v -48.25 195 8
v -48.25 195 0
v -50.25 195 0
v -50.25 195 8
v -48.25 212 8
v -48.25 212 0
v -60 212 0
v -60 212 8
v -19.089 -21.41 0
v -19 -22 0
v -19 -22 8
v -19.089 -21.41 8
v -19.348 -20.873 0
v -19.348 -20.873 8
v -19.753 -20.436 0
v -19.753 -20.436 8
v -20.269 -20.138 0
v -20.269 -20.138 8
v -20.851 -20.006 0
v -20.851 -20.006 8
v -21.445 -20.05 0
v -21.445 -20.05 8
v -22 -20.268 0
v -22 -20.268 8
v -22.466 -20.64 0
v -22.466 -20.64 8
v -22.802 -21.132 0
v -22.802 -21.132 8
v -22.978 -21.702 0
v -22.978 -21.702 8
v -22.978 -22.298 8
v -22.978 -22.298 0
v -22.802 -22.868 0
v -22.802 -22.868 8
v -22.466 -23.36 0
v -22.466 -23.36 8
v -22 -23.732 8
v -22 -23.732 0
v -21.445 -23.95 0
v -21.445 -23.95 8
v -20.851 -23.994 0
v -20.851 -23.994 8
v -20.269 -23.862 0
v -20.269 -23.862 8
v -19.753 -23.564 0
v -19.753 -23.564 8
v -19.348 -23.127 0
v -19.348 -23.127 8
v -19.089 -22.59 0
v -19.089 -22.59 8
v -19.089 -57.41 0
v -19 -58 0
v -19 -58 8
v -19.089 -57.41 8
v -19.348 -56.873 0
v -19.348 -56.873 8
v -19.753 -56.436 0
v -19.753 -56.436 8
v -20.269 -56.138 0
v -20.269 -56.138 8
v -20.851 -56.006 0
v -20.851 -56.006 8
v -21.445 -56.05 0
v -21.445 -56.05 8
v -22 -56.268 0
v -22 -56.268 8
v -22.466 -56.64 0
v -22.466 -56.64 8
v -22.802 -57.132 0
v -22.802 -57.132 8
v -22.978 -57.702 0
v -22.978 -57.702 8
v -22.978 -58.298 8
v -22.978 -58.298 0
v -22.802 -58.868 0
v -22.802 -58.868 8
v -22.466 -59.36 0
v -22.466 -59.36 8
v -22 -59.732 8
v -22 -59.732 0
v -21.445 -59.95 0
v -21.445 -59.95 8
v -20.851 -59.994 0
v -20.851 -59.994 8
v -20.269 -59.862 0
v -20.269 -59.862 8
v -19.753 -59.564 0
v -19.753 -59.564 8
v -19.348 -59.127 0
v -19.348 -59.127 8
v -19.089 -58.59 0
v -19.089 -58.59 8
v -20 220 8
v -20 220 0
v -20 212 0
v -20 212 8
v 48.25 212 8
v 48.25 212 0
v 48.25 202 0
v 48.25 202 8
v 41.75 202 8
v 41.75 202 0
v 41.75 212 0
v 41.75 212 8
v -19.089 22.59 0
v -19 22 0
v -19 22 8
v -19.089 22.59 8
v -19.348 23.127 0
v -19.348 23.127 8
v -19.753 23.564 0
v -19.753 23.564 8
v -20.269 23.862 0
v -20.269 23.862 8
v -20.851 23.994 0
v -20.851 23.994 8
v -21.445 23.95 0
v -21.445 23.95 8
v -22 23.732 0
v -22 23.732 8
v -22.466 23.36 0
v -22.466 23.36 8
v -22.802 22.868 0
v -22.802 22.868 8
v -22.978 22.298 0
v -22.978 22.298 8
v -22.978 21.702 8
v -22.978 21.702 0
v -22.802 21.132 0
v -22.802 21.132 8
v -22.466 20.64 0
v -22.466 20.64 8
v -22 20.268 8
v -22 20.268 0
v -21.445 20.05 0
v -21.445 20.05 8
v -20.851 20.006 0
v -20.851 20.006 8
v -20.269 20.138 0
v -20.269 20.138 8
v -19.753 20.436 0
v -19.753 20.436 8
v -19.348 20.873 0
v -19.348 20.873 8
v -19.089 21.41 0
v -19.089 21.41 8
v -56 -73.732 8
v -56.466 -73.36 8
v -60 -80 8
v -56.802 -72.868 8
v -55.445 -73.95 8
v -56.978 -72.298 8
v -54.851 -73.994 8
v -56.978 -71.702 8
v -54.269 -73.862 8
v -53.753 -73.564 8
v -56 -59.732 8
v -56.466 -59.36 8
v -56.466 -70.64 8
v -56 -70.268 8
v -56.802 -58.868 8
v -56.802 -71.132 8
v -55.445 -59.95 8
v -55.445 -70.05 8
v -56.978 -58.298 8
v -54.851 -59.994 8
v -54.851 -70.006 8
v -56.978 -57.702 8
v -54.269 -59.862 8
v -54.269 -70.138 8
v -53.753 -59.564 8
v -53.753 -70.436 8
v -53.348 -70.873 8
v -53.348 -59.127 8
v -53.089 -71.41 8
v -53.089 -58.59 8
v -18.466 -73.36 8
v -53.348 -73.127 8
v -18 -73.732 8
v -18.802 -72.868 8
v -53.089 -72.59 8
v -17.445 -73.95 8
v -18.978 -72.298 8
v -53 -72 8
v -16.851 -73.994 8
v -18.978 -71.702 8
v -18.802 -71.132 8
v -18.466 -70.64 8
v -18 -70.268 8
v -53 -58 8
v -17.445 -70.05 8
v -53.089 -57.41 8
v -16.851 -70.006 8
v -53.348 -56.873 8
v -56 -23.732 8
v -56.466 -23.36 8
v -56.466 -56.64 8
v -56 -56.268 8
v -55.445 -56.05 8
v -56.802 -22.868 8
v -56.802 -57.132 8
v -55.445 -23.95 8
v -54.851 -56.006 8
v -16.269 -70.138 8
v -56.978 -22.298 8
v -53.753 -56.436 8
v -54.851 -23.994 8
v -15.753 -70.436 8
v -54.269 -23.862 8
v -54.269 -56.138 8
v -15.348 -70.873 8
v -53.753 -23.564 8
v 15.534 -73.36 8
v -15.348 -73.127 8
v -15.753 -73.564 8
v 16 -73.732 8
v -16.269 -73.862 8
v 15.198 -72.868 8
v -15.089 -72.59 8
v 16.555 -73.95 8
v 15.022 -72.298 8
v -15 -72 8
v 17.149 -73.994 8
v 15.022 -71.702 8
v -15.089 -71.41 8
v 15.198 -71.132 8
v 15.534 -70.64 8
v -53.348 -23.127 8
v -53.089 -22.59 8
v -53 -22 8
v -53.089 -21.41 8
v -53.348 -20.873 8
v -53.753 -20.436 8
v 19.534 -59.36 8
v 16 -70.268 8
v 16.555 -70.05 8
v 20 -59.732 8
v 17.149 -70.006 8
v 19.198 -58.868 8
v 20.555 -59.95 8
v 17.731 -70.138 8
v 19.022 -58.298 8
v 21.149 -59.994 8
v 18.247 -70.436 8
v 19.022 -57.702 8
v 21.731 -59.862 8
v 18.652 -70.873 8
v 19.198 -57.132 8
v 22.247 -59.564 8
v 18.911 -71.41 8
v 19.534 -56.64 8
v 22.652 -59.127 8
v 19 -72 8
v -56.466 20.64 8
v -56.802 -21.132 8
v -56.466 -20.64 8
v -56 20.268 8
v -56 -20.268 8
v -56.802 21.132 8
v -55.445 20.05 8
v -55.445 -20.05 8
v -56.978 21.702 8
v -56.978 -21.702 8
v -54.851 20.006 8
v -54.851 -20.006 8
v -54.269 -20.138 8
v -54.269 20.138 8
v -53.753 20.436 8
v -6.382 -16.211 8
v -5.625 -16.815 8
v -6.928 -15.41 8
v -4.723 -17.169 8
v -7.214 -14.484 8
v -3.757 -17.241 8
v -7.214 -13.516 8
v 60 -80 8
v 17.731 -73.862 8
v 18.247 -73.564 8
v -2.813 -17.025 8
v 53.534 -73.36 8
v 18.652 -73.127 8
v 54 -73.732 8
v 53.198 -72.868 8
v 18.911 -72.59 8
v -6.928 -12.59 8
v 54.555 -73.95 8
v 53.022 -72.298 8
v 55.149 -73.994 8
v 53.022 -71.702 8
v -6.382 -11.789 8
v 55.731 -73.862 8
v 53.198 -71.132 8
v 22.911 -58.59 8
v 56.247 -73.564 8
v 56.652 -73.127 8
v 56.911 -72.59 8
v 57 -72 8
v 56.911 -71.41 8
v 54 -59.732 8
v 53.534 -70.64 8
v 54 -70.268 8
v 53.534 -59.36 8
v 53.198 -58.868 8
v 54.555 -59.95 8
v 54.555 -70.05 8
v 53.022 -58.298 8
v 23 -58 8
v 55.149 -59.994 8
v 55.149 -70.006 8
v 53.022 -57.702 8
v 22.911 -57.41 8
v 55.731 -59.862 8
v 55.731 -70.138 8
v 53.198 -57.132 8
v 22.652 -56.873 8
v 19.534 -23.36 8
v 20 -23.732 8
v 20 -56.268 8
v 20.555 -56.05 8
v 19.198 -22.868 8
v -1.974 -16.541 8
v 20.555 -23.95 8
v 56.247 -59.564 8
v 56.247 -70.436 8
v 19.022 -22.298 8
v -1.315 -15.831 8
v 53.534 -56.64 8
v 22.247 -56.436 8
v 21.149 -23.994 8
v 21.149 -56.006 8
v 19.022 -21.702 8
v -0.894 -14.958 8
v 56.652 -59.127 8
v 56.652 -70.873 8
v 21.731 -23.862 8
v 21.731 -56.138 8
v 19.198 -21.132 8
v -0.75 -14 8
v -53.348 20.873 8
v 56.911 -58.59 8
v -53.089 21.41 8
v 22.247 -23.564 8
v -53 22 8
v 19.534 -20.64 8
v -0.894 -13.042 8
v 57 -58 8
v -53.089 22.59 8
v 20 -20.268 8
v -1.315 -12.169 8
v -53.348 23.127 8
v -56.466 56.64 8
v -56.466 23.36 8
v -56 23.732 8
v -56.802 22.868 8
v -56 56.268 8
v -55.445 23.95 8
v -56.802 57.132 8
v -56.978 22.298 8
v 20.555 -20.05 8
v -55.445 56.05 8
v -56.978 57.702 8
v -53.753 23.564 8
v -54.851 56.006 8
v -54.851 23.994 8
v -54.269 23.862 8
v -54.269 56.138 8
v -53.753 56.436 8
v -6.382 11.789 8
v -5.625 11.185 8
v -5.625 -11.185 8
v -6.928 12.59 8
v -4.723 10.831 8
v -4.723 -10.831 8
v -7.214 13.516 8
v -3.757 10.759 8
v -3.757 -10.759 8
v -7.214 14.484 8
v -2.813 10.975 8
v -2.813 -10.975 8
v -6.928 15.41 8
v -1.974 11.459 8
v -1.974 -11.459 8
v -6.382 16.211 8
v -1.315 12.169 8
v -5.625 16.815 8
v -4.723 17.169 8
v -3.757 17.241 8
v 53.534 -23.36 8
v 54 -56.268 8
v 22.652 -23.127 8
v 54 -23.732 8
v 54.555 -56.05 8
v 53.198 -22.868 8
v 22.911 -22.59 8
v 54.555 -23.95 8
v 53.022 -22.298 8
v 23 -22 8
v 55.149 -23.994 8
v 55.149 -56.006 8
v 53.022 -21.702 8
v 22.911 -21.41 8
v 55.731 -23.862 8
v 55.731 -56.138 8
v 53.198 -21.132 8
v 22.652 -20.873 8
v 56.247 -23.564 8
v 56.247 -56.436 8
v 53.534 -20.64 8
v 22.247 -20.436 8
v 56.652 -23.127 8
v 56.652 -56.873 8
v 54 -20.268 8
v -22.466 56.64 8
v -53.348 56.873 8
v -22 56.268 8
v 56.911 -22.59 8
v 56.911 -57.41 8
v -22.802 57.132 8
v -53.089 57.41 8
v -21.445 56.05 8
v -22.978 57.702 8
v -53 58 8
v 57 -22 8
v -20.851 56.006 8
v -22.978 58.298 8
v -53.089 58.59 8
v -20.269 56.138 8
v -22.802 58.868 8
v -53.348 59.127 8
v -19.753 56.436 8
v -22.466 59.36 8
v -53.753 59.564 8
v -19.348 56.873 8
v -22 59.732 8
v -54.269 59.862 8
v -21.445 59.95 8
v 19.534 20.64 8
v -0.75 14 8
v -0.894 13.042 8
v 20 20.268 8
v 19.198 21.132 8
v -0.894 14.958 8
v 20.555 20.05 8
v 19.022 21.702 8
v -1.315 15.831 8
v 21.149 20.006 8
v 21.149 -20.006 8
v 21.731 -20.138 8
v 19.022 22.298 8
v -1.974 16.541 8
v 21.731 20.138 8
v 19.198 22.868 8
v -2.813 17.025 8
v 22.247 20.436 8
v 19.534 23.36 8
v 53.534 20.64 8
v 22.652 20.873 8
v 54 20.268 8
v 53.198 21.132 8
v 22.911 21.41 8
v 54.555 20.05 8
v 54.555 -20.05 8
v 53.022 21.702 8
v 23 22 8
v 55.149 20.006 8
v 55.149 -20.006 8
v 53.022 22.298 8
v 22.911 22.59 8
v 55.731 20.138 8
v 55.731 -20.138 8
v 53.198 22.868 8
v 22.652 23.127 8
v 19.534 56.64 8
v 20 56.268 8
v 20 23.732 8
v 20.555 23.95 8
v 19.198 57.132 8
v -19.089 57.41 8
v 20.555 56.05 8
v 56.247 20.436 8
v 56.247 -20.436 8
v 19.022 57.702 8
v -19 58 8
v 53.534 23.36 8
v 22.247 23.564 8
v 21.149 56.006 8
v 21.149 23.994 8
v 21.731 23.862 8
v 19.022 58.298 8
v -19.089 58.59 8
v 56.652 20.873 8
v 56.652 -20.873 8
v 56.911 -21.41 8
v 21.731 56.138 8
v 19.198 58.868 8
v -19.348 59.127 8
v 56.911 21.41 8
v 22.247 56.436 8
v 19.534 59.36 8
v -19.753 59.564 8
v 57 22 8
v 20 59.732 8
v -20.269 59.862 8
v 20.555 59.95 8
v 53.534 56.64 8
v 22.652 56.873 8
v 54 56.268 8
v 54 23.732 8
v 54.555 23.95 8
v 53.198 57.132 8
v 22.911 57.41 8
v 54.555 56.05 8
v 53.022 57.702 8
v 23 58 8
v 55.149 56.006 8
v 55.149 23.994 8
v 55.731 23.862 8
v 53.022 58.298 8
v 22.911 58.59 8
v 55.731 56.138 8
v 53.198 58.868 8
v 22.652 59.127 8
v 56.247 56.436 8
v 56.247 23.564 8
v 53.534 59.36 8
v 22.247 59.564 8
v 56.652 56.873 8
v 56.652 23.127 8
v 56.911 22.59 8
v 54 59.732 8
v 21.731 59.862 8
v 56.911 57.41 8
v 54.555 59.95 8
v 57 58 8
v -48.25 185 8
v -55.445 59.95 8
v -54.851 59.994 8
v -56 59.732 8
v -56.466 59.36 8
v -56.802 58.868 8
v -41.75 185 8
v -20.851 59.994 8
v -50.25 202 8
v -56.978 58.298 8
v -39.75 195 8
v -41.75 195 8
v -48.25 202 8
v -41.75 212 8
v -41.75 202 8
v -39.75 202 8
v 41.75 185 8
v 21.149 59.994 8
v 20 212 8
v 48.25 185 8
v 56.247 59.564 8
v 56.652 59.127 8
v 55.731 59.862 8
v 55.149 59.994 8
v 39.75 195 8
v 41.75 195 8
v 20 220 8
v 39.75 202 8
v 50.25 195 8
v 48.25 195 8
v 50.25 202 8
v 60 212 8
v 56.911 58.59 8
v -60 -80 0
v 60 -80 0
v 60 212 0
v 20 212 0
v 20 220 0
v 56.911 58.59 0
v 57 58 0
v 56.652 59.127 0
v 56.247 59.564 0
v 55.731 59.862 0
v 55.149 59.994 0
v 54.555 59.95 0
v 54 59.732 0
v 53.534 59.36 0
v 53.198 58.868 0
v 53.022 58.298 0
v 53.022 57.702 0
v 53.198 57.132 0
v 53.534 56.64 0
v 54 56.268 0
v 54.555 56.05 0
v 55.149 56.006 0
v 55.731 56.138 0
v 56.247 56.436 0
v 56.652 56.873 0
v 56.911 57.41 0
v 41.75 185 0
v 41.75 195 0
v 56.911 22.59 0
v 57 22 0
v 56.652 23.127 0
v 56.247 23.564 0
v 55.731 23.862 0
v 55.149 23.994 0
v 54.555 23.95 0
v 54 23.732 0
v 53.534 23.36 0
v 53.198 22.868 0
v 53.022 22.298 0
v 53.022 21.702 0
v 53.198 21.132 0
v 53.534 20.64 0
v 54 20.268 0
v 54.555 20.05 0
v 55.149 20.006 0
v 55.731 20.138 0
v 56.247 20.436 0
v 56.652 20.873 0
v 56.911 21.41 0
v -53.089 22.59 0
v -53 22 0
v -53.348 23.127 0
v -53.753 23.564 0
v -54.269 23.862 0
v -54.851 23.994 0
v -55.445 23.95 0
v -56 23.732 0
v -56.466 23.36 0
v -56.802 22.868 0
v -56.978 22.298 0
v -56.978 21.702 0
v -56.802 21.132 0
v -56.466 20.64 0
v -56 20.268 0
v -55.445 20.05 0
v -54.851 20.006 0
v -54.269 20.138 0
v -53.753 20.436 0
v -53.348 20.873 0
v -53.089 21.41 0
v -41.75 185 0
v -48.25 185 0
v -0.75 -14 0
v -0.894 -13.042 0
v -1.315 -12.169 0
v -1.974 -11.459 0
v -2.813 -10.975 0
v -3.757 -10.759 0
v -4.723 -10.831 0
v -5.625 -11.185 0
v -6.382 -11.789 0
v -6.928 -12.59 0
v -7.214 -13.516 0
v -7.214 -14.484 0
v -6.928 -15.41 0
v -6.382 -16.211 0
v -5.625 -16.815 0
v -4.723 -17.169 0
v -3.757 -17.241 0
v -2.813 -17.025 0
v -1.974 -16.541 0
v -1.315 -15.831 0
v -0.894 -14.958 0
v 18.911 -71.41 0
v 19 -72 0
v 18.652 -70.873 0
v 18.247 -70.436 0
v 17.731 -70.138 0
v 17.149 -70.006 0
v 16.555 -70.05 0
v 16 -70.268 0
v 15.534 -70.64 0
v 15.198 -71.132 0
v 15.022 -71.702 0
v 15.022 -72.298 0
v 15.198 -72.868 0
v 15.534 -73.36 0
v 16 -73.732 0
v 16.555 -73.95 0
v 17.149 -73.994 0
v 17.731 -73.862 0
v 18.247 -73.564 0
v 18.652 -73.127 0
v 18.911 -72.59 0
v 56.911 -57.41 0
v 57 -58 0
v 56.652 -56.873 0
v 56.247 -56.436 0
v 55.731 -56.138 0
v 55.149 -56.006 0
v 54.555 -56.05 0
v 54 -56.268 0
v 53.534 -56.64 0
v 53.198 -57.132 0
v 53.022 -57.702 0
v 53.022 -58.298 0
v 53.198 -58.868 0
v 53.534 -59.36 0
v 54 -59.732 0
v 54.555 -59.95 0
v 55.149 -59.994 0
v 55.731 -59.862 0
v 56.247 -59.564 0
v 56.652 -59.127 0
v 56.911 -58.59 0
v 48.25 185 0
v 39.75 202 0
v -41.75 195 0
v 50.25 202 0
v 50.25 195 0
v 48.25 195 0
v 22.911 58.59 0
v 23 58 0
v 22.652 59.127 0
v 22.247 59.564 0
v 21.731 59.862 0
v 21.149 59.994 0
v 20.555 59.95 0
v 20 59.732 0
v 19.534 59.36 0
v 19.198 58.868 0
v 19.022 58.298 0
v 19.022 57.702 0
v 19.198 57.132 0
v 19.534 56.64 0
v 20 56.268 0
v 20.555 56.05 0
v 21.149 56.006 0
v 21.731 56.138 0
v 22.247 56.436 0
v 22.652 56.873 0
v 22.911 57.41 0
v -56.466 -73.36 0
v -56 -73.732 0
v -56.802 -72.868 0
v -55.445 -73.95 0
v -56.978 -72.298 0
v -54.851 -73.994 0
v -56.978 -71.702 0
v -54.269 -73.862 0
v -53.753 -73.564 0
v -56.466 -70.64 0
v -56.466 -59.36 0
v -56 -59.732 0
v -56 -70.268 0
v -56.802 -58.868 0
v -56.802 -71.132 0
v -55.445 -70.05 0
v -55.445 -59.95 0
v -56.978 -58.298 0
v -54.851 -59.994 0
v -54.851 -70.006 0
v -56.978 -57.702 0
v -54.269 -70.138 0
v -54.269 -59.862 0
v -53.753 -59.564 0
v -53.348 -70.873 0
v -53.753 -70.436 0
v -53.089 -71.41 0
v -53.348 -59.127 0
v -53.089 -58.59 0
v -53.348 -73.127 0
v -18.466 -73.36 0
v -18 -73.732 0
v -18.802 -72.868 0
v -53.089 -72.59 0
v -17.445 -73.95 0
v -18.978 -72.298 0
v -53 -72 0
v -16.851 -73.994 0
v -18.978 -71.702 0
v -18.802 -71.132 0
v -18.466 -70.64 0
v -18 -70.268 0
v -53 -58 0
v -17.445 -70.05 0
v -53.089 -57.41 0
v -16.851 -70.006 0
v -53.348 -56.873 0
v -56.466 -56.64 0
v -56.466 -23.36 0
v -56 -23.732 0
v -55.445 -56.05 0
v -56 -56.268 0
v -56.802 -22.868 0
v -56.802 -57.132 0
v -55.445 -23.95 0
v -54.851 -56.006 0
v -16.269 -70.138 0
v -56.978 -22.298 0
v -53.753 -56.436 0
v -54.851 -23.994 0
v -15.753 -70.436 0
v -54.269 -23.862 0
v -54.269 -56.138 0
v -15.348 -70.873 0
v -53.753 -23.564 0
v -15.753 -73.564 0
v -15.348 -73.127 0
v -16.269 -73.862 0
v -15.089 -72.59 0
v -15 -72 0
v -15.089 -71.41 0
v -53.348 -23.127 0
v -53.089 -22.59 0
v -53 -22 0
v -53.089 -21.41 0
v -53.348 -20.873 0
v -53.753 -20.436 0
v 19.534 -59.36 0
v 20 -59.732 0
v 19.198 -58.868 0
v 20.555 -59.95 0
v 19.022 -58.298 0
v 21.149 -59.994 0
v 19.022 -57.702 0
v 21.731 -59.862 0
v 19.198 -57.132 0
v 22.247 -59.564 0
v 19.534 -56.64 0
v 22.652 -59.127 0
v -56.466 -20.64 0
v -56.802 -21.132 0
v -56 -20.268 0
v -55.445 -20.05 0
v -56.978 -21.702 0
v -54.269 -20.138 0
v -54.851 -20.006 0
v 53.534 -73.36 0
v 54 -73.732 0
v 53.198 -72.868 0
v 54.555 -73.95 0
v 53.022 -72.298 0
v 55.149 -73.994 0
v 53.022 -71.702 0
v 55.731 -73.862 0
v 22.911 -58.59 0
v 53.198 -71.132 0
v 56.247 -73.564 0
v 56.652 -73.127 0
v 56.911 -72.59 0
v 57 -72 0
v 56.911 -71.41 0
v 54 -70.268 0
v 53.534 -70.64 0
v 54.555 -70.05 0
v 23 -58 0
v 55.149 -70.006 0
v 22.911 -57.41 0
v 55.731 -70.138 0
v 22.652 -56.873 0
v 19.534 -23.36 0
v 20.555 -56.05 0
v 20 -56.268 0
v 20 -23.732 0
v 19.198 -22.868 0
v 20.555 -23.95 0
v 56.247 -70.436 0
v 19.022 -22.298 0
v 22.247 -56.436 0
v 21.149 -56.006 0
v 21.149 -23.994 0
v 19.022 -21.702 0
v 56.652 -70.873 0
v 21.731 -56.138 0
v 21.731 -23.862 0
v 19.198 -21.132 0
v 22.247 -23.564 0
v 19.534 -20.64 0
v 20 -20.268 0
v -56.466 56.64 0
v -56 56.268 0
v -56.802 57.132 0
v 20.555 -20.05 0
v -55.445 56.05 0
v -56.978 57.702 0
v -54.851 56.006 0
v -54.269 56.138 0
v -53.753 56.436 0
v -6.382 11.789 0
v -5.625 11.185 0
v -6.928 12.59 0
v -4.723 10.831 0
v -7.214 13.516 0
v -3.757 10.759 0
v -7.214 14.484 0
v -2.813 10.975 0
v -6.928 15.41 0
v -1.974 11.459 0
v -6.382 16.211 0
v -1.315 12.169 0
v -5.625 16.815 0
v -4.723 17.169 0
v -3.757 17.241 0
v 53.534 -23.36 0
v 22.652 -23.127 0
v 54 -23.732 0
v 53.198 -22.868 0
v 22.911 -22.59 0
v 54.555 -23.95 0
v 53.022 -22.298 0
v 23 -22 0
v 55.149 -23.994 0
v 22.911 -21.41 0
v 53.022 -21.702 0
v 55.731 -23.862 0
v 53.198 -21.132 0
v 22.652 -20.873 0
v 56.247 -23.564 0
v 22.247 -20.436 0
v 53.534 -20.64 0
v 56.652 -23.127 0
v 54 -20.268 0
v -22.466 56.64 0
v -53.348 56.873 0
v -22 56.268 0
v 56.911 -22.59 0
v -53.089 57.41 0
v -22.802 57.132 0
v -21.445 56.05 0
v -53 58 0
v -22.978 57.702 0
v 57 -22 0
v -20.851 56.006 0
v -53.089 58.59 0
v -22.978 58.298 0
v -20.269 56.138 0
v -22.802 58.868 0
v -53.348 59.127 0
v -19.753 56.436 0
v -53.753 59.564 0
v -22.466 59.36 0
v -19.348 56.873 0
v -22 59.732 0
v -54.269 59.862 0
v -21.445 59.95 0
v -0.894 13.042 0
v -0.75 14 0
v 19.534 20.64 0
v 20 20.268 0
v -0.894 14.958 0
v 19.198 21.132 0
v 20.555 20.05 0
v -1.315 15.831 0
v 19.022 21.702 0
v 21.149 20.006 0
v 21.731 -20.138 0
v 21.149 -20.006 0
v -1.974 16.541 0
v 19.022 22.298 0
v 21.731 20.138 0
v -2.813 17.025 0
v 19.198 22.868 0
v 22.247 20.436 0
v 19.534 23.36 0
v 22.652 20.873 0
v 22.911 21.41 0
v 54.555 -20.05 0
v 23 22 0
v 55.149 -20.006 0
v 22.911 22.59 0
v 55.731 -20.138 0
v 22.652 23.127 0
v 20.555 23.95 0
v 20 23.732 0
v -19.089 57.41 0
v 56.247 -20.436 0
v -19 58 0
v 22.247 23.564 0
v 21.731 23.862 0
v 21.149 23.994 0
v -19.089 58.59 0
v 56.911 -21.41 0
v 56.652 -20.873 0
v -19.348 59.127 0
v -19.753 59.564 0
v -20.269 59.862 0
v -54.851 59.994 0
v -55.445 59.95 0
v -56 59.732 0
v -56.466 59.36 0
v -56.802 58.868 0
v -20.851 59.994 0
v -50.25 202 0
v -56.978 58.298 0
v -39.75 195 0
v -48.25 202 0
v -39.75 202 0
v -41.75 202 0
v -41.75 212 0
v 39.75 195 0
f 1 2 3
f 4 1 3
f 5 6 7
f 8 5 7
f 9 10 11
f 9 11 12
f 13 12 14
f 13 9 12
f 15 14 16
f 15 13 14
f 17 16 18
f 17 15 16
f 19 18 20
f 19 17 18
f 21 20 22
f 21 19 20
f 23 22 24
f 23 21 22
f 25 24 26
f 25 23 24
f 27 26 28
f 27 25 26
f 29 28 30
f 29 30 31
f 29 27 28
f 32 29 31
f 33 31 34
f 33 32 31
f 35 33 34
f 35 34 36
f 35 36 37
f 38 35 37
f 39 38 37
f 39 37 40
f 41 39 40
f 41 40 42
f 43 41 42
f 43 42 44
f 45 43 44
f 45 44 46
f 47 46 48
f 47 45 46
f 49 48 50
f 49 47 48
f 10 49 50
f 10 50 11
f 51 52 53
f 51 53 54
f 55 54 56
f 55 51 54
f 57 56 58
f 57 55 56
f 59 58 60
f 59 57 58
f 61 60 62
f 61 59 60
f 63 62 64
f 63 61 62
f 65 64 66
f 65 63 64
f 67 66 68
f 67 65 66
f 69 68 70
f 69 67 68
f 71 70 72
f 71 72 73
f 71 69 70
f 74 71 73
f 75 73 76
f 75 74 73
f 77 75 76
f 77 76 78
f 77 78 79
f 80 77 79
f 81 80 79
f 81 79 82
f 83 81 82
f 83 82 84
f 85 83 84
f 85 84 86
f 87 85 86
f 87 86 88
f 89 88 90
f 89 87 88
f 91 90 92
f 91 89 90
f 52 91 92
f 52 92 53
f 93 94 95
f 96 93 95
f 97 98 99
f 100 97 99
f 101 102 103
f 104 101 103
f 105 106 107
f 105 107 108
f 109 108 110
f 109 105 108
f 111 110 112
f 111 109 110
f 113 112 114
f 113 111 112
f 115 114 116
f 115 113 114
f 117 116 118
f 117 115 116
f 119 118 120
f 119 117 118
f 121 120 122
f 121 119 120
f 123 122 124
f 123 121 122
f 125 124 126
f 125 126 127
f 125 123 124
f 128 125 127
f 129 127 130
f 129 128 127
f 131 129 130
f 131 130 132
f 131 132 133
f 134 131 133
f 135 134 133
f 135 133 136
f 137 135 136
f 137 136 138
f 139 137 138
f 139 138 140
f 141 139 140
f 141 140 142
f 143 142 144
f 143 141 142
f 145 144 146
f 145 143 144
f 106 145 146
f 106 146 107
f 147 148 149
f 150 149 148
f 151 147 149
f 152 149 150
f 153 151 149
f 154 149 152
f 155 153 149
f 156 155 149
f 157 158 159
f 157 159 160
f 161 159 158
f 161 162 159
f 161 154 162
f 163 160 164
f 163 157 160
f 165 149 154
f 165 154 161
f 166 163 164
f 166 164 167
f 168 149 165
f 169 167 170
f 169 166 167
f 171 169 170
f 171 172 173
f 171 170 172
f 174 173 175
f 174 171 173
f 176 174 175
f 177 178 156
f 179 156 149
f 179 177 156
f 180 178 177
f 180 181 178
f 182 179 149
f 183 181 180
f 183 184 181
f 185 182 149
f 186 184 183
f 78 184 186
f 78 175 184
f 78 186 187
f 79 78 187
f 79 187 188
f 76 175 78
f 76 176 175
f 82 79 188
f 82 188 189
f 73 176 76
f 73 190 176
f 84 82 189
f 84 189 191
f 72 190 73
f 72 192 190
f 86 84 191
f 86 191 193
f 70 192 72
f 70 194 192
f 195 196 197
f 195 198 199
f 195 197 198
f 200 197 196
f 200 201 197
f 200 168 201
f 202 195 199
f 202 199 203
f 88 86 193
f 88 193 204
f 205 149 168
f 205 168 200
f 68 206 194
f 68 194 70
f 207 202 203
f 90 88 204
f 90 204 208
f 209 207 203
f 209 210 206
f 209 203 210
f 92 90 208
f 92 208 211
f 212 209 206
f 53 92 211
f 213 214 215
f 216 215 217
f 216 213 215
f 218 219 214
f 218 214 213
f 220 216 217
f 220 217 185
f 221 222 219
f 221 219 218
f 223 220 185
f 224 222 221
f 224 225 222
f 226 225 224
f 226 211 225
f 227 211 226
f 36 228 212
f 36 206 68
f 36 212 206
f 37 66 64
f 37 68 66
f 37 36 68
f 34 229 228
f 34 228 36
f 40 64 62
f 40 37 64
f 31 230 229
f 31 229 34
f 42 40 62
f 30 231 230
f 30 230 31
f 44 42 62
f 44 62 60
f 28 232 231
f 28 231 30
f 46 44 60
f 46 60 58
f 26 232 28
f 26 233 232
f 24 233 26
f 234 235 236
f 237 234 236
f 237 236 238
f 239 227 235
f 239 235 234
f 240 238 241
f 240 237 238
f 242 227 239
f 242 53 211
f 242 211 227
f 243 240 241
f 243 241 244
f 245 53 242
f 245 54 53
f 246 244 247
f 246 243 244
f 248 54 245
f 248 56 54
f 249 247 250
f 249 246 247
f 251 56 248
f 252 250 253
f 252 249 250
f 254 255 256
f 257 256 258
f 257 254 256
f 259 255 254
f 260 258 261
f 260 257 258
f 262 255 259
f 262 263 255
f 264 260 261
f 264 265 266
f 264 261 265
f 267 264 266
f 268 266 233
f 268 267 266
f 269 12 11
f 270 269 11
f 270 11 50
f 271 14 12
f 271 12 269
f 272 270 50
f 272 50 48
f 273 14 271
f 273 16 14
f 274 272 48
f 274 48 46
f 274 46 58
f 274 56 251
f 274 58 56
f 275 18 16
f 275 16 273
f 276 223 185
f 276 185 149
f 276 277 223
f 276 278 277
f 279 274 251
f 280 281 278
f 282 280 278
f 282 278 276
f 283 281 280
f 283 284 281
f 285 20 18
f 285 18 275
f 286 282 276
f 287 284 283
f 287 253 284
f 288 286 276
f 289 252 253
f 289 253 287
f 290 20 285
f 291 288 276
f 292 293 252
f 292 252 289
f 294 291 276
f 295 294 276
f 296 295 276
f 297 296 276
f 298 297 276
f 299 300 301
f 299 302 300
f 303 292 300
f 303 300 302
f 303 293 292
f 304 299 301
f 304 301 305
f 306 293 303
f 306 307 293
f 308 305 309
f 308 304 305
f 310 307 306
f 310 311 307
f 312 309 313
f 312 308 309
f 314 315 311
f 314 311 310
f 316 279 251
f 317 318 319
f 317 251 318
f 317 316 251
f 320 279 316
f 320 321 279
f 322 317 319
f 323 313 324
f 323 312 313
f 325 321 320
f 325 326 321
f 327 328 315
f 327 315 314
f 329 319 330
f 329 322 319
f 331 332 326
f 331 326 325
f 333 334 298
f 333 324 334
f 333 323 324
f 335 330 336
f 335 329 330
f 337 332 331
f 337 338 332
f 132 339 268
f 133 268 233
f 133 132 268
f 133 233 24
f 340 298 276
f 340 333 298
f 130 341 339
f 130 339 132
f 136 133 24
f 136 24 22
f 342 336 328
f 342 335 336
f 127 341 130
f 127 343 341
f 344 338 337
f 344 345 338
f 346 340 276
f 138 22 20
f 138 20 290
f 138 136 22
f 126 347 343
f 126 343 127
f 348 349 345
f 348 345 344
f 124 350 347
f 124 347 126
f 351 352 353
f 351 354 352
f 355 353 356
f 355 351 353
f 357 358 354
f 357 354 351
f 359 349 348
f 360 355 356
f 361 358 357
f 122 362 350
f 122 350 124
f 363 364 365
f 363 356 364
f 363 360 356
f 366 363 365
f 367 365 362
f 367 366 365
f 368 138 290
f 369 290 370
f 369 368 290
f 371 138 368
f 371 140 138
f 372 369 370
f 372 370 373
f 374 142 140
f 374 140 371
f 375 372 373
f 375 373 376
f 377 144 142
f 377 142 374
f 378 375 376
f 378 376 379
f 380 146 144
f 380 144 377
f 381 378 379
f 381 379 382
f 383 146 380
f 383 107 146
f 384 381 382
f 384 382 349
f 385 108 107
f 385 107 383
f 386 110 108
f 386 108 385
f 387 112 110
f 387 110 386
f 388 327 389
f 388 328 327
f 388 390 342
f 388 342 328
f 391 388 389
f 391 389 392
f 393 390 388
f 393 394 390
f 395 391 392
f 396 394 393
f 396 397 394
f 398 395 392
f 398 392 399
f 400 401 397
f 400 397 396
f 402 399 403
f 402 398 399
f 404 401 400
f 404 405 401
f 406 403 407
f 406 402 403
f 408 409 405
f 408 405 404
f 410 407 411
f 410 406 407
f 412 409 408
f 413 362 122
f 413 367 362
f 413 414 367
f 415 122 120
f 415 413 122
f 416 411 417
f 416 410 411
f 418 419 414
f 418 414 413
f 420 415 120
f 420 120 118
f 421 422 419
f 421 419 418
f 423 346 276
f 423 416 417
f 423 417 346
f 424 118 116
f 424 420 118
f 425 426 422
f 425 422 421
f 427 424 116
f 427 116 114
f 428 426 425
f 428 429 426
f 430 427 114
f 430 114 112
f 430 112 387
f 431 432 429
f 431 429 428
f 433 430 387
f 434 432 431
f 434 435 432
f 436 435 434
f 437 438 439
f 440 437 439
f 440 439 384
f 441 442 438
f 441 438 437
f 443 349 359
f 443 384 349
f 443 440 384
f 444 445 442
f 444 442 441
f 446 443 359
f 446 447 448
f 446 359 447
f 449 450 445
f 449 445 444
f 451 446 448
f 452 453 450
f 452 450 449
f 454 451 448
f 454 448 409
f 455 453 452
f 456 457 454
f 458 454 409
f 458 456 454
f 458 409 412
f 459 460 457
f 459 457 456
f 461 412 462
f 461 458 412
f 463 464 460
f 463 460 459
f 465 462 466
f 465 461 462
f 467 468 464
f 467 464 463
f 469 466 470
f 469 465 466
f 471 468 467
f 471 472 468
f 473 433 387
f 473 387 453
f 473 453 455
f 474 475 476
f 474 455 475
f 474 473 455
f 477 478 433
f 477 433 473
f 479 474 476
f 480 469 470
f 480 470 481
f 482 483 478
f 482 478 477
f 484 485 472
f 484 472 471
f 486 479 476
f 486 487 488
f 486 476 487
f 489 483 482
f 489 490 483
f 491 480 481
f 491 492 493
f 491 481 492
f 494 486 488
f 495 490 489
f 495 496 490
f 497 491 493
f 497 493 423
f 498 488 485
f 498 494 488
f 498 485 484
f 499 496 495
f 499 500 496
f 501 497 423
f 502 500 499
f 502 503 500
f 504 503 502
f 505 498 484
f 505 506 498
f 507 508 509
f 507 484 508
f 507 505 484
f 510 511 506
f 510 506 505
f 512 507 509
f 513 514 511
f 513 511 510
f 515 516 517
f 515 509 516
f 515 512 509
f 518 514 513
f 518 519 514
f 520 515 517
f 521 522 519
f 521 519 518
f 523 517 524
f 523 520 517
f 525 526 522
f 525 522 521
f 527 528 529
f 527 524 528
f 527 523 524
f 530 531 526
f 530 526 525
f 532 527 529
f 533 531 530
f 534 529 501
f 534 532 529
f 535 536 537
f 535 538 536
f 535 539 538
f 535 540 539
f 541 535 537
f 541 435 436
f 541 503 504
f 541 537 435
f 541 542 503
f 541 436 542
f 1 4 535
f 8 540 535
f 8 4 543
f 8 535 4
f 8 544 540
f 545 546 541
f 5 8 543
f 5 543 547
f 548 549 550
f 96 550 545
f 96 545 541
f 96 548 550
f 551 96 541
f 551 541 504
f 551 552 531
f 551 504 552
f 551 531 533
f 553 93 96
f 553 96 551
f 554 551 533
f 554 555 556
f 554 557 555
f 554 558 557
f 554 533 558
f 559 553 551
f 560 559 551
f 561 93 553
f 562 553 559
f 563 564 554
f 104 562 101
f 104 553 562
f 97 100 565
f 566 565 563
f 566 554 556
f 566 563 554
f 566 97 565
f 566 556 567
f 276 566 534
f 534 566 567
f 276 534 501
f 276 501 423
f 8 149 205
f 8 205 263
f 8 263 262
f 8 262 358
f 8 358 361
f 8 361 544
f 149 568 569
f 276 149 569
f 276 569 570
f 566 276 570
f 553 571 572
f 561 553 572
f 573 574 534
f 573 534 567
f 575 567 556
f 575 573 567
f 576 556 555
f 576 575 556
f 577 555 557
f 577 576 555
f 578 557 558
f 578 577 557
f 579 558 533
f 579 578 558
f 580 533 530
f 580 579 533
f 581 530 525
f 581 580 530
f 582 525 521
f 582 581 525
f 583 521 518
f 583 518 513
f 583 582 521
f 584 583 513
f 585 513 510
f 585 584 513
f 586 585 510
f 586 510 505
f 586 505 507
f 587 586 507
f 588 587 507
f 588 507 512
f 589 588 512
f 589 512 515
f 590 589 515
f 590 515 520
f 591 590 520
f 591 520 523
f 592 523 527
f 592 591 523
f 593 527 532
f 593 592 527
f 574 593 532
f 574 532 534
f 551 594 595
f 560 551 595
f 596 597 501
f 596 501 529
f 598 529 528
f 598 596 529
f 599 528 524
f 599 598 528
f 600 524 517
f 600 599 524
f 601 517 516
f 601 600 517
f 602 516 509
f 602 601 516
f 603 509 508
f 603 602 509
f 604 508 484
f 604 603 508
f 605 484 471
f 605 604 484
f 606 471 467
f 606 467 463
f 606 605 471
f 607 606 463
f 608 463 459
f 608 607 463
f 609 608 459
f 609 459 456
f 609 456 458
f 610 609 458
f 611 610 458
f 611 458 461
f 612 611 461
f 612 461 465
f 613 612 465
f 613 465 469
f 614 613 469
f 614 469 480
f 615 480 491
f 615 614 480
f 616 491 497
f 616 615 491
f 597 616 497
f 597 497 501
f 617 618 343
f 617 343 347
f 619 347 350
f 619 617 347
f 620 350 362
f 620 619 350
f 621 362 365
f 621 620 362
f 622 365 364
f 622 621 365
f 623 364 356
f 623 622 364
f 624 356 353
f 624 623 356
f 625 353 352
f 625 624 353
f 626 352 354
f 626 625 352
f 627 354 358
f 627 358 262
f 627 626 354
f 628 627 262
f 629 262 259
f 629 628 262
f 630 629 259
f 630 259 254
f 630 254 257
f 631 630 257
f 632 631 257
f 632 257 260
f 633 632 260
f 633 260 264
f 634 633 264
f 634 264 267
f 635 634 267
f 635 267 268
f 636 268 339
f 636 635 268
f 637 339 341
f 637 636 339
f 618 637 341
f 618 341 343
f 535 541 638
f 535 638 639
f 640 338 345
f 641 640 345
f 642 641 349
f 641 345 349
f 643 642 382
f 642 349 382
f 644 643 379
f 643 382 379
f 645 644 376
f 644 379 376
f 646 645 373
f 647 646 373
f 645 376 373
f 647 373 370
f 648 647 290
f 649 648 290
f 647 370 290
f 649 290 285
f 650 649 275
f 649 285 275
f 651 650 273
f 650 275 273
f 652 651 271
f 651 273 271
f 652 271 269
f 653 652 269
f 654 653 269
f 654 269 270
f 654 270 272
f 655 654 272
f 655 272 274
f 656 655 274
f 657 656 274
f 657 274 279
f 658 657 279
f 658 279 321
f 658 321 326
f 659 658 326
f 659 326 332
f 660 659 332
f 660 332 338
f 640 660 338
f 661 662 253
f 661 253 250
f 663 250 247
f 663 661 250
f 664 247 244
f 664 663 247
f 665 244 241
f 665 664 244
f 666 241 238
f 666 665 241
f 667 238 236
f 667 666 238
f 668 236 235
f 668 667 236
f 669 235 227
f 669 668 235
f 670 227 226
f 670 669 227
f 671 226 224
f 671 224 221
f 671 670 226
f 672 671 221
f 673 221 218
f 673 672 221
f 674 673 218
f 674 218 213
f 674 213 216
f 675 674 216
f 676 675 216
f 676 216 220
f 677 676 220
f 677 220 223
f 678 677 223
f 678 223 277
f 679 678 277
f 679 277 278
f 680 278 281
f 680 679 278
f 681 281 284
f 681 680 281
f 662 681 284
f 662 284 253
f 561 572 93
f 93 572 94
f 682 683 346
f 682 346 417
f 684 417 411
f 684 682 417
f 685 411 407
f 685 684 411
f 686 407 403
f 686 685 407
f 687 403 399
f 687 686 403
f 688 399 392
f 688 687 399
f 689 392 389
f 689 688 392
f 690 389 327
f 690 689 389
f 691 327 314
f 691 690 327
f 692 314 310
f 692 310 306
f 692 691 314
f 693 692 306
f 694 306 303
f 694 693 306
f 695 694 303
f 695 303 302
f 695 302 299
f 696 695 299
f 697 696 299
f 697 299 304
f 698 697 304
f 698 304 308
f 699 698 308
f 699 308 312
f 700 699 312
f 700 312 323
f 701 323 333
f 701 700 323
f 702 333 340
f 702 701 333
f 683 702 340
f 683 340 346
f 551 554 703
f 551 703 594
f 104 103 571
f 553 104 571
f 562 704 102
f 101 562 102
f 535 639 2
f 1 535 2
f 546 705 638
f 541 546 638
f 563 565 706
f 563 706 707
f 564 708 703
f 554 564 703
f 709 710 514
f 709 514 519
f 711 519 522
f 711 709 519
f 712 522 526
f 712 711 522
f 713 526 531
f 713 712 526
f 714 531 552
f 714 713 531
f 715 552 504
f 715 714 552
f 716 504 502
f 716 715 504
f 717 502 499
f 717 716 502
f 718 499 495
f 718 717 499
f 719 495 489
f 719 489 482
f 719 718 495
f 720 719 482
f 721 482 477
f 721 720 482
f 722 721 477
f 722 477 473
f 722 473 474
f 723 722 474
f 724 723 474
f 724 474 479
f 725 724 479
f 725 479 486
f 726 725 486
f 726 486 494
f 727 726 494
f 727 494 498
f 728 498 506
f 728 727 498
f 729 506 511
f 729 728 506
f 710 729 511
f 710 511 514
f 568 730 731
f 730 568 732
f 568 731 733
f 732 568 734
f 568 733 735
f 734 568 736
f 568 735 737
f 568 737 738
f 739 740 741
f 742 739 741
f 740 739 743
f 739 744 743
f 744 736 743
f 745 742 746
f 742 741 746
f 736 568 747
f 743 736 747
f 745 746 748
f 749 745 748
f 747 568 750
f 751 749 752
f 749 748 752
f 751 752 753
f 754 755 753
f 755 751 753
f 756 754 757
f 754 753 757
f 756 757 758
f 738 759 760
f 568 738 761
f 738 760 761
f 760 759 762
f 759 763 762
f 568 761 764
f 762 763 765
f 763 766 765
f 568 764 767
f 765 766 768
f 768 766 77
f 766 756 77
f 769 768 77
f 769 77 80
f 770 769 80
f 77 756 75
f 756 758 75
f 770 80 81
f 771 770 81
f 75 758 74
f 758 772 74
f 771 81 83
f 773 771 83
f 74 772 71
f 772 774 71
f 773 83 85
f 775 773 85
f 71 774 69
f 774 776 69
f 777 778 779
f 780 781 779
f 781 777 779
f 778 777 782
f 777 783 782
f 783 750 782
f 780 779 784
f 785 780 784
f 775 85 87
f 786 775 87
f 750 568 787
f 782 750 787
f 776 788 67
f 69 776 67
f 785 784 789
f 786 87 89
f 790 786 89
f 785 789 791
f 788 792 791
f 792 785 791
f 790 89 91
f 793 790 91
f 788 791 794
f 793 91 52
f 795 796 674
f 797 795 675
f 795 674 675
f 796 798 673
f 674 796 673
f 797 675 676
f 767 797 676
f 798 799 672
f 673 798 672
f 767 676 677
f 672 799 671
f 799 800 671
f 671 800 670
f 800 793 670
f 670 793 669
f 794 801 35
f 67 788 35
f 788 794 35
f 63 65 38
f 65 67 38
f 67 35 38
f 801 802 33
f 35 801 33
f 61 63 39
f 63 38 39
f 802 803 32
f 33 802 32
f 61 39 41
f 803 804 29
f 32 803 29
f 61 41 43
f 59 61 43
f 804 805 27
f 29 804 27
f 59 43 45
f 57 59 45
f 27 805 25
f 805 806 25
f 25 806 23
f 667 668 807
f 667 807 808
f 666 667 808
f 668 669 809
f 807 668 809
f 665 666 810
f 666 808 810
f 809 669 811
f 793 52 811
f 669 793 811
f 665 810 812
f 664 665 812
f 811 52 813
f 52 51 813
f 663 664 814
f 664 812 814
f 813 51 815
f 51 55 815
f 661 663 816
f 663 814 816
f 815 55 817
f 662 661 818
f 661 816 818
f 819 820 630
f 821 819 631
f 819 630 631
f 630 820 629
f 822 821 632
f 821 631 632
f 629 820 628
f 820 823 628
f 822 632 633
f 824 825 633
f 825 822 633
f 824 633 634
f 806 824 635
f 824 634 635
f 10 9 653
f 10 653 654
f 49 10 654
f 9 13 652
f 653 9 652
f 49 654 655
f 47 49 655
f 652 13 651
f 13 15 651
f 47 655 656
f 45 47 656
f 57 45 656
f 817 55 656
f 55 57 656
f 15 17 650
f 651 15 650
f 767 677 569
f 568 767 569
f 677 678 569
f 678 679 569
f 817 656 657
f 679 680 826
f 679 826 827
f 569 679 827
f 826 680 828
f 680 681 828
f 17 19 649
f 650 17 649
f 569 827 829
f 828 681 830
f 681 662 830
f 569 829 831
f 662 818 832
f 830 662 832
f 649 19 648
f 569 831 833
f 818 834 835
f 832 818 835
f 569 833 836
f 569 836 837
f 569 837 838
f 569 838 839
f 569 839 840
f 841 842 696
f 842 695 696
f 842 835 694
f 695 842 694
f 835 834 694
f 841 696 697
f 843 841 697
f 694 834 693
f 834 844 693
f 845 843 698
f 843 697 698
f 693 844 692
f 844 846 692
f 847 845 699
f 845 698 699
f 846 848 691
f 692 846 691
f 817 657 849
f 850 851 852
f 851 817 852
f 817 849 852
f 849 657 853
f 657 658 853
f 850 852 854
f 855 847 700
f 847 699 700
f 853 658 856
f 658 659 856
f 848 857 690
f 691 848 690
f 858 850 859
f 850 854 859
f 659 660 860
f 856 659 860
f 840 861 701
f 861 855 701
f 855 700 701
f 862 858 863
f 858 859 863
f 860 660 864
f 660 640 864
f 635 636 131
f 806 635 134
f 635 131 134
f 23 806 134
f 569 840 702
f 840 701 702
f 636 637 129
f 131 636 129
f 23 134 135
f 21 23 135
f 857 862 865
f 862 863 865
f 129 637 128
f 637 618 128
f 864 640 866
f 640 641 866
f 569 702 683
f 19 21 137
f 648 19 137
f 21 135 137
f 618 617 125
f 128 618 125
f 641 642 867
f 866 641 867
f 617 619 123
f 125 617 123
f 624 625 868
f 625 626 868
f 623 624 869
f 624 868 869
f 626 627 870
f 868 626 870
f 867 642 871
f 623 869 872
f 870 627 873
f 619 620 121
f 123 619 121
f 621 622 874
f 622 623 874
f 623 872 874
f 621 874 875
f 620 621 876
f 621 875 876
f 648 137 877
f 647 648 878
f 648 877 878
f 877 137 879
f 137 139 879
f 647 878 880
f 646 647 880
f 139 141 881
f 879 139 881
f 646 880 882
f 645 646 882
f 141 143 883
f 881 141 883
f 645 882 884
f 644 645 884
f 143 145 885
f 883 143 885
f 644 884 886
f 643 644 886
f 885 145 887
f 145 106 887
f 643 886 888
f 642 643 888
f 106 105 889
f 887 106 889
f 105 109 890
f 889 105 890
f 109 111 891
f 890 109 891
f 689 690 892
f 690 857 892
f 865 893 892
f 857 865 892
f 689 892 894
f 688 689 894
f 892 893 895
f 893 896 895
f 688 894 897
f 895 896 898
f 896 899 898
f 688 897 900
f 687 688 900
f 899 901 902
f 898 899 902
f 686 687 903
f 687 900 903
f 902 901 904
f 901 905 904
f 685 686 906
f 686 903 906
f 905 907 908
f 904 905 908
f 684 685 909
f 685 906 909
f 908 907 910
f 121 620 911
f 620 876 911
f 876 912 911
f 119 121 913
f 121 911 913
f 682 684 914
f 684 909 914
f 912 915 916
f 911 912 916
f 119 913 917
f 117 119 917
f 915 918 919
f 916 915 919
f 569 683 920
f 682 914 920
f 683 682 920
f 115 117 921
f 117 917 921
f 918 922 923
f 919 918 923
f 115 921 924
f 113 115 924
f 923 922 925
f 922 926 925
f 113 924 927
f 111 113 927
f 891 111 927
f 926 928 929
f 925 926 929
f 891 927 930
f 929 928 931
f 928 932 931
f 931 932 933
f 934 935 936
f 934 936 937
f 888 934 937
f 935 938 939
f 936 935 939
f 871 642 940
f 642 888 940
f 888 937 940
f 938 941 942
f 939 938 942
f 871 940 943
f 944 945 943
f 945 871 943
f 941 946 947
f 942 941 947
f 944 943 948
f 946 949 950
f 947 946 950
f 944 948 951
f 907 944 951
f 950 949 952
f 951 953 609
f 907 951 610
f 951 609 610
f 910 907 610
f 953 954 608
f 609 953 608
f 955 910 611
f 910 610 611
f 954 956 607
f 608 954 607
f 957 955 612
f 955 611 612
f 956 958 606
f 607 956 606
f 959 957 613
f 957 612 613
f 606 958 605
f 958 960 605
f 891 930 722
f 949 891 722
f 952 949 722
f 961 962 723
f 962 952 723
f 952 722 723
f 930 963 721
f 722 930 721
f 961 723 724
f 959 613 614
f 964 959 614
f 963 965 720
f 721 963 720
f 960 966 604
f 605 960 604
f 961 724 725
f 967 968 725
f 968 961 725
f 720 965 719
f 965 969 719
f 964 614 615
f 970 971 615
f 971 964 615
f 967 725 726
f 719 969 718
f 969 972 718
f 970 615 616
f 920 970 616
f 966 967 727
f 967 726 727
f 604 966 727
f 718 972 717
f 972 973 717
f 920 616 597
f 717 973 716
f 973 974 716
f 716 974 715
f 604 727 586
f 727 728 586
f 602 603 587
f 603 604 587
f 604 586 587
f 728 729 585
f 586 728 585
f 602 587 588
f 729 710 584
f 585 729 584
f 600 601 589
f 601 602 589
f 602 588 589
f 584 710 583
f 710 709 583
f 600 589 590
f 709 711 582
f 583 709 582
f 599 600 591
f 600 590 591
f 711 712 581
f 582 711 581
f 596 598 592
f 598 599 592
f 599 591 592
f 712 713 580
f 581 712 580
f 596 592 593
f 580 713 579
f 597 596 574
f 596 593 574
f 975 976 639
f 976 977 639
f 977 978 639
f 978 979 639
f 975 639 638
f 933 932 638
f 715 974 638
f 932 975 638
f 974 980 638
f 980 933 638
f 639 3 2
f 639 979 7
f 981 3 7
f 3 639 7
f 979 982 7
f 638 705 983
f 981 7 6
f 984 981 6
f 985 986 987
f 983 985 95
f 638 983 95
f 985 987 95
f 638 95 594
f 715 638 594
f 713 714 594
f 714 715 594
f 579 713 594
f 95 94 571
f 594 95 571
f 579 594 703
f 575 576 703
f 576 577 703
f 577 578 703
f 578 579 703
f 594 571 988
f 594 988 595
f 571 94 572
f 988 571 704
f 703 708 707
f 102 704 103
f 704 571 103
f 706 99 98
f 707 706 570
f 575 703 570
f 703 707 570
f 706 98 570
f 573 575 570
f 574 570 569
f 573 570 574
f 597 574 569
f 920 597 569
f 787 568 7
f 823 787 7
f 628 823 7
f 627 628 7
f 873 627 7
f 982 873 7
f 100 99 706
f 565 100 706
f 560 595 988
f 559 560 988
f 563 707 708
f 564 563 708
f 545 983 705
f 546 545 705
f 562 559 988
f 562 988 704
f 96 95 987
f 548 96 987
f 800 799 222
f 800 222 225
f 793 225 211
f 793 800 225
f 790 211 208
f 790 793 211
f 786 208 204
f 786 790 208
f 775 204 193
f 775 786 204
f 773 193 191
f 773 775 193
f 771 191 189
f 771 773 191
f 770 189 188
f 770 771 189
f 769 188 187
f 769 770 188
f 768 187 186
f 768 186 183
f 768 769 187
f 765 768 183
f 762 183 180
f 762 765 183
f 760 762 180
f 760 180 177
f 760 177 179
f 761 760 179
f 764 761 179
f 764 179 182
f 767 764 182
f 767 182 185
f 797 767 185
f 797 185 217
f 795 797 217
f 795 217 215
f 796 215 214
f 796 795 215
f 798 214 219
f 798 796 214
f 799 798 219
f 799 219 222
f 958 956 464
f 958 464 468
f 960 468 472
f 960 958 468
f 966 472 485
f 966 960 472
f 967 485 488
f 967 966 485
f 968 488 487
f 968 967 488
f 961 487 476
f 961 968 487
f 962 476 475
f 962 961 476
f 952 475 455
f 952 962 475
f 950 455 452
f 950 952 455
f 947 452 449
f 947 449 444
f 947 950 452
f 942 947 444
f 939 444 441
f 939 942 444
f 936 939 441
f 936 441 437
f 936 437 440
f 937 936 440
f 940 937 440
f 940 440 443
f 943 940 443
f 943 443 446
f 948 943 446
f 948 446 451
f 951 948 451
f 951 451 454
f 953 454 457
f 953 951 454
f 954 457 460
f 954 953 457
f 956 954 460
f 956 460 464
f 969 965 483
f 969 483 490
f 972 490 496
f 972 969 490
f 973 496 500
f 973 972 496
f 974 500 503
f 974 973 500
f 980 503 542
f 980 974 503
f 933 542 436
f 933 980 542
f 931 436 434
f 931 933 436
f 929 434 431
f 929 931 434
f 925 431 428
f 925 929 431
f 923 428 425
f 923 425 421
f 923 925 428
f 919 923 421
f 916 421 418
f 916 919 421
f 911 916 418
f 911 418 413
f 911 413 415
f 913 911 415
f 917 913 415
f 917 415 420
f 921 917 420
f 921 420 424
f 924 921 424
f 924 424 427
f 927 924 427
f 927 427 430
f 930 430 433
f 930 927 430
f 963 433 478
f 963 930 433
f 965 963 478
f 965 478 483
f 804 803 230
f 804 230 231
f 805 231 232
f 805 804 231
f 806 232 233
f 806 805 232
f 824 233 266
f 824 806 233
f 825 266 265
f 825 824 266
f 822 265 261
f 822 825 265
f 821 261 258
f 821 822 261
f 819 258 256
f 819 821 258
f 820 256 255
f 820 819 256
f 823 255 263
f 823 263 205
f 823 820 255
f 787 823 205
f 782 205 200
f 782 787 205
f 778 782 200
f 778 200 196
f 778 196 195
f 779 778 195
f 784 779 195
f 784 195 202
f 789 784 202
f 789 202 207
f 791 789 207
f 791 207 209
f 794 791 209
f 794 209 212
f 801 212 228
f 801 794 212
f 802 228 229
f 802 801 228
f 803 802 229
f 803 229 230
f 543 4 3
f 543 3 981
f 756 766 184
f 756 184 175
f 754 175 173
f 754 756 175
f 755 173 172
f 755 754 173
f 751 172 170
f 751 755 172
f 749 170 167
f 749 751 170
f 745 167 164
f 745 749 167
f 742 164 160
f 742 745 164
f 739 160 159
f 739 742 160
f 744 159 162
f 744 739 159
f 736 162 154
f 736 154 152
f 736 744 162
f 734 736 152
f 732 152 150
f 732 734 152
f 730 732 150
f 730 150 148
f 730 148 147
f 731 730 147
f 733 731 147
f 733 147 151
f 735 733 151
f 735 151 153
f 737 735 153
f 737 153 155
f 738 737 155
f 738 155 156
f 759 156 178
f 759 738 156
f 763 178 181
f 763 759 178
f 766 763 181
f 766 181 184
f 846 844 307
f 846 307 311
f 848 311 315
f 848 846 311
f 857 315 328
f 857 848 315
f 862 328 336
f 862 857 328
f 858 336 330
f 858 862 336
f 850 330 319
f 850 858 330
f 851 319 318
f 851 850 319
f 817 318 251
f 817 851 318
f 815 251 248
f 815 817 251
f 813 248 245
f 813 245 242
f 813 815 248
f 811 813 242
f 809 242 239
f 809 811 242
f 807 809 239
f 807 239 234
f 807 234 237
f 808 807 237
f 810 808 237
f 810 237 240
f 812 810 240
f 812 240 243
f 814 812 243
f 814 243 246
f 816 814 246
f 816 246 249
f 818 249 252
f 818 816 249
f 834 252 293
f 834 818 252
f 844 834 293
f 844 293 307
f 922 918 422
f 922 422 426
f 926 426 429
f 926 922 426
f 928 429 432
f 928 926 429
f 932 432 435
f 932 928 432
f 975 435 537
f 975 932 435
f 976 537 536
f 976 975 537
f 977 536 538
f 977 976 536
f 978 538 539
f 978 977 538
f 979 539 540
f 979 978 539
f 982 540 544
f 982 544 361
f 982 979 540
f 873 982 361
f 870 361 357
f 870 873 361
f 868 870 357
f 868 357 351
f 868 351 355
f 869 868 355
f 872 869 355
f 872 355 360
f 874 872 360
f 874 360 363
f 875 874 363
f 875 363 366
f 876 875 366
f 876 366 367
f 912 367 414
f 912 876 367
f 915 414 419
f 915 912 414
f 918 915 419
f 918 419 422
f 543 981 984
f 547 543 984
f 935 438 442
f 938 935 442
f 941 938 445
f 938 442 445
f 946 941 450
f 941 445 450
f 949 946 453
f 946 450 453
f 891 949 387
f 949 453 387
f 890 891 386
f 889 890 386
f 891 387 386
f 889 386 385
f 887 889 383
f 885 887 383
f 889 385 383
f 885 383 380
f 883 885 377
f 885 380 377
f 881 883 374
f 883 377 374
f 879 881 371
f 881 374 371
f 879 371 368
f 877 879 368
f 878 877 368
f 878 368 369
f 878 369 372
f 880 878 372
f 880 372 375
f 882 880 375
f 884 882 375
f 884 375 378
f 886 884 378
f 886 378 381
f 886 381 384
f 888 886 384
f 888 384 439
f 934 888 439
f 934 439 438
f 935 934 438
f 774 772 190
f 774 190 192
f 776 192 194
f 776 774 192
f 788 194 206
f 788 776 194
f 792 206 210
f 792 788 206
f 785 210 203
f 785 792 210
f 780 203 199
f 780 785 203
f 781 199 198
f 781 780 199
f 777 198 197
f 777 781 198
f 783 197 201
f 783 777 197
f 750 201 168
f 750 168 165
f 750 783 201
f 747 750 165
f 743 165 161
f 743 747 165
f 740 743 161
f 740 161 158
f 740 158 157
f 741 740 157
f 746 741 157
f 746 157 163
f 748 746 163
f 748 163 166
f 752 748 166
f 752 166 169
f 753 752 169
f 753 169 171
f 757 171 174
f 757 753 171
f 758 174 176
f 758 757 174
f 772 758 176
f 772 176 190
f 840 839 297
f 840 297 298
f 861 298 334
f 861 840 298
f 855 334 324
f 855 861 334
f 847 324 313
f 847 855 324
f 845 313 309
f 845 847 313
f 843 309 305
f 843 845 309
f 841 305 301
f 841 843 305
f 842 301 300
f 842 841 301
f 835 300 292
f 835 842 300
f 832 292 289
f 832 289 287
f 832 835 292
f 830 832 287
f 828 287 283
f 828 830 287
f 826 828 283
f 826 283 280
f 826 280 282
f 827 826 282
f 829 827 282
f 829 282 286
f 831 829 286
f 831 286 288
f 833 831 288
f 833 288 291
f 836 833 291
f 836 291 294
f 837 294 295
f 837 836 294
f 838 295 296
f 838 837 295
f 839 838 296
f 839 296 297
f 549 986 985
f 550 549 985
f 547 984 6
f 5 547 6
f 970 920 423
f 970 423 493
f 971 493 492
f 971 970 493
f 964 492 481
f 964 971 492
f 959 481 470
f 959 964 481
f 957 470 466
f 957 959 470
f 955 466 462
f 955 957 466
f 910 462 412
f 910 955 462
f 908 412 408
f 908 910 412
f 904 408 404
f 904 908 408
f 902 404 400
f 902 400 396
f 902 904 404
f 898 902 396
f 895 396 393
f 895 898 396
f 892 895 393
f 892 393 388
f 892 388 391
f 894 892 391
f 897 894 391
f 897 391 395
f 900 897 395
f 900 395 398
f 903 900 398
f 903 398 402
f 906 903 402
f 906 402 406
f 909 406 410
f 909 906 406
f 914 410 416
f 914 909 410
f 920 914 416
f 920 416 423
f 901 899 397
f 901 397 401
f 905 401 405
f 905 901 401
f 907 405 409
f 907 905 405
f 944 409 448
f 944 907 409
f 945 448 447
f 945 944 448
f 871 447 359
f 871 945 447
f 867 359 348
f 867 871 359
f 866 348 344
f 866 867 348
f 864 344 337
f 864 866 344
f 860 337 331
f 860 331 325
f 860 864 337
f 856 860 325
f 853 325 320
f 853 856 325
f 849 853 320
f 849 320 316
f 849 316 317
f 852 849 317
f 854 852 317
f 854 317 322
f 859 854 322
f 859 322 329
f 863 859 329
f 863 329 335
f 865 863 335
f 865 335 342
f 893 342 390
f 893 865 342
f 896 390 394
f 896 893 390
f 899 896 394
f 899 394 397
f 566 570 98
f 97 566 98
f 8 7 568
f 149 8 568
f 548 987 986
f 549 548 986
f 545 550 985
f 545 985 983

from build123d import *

# Parameters (mm, degrees)
F0_R     = 2
F1_DEPTH = 8
F2_R     = 3.25
F3_DEPTH = 8.001


with BuildPart() as f1:
    # F0 (on Top) → F1 (new body)
    with BuildSketch(Plane.XY):
        Polygon((60, -80), (60, 212), (48.25, 212), (48.25, 202), (50.25, 202), (50.25, 195), (48.25, 195), (48.25, 185), (41.75, 185), (41.75, 195), (39.75, 195), (39.75, 202), (41.75, 202), (41.75, 212), (20, 212), (20, 220), (-20, 220), (-20, 212), (-41.75, 212), (-41.75, 202), (-39.75, 202), (-39.75, 195), (-41.75, 195), (-41.75, 185), (-48.25, 185), (-48.25, 195), (-50.25, 195), (-50.25, 202), (-48.25, 202), (-48.25, 212), (-60, 212), (-60, -80), align=None)
        with Locations((-55, -72)):
            Circle(F0_R, mode=Mode.SUBTRACT)
        with Locations((-55, -58)):
            Circle(F0_R, mode=Mode.SUBTRACT)
        with Locations((-55, -22)):
            Circle(F0_R, mode=Mode.SUBTRACT)
        with Locations((-17, -72)):
            Circle(F0_R, mode=Mode.SUBTRACT)
        with Locations((-21, -58)):
            Circle(F0_R, mode=Mode.SUBTRACT)
        with Locations((-21, -22)):
            Circle(F0_R, mode=Mode.SUBTRACT)
        with Locations((-55, 22)):
            Circle(F0_R, mode=Mode.SUBTRACT)
        with Locations((-55, 58)):
            Circle(F0_R, mode=Mode.SUBTRACT)
        with Locations((-21, 22)):
            Circle(F0_R, mode=Mode.SUBTRACT)
        with Locations((-21, 58)):
            Circle(F0_R, mode=Mode.SUBTRACT)
        with Locations((17, -72)):
            Circle(F0_R, mode=Mode.SUBTRACT)
        with Locations((21, -58)):
            Circle(F0_R, mode=Mode.SUBTRACT)
        with Locations((21, -22)):
            Circle(F0_R, mode=Mode.SUBTRACT)
        with Locations((55, -72)):
            Circle(F0_R, mode=Mode.SUBTRACT)
        with Locations((55, -58)):
            Circle(F0_R, mode=Mode.SUBTRACT)
        with Locations((55, -22)):
            Circle(F0_R, mode=Mode.SUBTRACT)
        with Locations((21, 22)):
            Circle(F0_R, mode=Mode.SUBTRACT)
        with Locations((21, 58)):
            Circle(F0_R, mode=Mode.SUBTRACT)
        with Locations((55, 22)):
            Circle(F0_R, mode=Mode.SUBTRACT)
        with Locations((55, 58)):
            Circle(F0_R, mode=Mode.SUBTRACT)
    extrude(amount=F1_DEPTH)

    # F2 (on face) → F3 (cut, through all)
    with BuildSketch(Plane.XY.offset(8)):
        with Locations((-4, 14)):
            Circle(F2_R)
        with Locations((-4, -14)):
            Circle(F2_R)
    extrude(amount=-F3_DEPTH, mode=Mode.SUBTRACT)


solid = f1.part
